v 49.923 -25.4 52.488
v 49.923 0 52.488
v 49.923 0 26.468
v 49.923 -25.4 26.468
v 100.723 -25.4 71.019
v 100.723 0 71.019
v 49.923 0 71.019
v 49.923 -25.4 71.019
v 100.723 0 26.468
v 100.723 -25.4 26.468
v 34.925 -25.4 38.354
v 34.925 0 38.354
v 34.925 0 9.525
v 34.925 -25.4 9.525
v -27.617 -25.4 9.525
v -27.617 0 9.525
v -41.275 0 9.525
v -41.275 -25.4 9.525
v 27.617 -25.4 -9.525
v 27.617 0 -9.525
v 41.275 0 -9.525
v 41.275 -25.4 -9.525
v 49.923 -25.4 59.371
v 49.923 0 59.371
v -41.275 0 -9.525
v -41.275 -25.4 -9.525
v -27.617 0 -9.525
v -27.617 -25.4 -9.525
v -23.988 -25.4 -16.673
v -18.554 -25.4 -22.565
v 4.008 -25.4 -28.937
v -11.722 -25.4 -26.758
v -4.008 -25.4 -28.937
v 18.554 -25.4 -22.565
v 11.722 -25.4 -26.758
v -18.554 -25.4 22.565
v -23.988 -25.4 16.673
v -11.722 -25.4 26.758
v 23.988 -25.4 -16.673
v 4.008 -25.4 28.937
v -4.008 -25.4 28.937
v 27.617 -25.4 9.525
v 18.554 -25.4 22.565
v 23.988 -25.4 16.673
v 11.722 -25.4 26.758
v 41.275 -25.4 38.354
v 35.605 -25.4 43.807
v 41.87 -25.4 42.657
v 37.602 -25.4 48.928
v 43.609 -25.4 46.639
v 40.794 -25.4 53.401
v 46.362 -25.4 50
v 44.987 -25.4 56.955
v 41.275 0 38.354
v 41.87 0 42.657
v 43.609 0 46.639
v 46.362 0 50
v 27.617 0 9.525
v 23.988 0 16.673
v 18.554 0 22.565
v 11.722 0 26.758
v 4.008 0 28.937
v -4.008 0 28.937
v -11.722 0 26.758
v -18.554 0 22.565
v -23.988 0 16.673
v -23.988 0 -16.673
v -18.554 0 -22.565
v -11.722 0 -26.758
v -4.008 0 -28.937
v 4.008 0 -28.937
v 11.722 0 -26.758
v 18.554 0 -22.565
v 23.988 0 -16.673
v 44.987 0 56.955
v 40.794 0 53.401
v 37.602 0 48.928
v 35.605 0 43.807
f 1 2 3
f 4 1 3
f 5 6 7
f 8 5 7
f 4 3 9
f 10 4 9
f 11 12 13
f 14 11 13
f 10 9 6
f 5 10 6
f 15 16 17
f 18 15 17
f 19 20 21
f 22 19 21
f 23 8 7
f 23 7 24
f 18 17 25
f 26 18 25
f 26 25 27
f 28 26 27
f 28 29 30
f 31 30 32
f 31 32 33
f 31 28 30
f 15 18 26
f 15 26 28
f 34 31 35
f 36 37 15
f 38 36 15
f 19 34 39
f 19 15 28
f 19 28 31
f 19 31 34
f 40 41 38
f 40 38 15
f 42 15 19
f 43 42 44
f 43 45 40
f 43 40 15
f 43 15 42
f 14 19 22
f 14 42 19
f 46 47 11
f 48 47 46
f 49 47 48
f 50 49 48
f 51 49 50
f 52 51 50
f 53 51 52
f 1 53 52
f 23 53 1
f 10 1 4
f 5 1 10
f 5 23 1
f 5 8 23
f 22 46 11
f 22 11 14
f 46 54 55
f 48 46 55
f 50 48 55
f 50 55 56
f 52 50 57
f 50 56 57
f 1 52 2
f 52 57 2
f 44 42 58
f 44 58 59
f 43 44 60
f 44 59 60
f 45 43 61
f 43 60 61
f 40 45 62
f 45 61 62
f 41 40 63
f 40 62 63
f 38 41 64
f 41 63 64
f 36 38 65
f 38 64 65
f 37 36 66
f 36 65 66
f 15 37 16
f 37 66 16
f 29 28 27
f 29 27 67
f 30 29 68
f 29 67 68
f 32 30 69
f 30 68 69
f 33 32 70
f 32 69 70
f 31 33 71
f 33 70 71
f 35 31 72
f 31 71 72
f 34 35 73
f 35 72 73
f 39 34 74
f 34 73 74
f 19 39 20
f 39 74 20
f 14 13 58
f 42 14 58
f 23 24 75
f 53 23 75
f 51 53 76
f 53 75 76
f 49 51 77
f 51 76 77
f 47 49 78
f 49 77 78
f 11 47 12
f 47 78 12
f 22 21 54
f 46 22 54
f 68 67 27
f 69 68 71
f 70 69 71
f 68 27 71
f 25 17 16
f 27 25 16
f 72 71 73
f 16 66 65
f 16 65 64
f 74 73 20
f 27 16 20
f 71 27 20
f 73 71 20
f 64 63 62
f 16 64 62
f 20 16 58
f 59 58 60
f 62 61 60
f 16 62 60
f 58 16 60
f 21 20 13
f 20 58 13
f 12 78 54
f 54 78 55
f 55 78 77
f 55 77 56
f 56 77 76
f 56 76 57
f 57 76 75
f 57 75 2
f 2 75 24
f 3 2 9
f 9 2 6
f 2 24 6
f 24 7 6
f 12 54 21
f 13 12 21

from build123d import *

# Parameters (mm, degrees)
F1_DEPTH = 25.4
F2_DEPTH = 25.4
F3_DEPTH = 25.4
F4_DEPTH = 25.4


with BuildPart() as f1:
    # F0 (on Front) → F1 (new body)
    with BuildSketch(Plane.XZ):
        with BuildLine():
            Line((34.9249988794, 38.3535841248), (34.9249988794, 9.525))
            Line((34.9249988794, 9.525), (41.275, 9.525))
            Line((41.275, 9.525), (41.275, 38.3535841248))
            ThreePointArc((41.275, 38.3535841248), (43.6085299046, 46.6387644279), (49.9230897833, 52.4882009827))
            Line((49.9230897833, 52.4882009827), (49.9230897833, 59.3707781223))
            ThreePointArc((49.9230897833, 59.3707781223), (39.0589972297, 51.2635141623), (34.9249988794, 38.3535841248))
        make_face()
        with BuildLine():
            Line((41.275, 9.525), (34.9249988794, 9.525))
            Line((34.9249988794, 9.525), (27.6167455206, 9.525))
            ThreePointArc((27.6167455206, 9.525), (28.811311946, 4.8289297054), (29.2131863745, 0))
            ThreePointArc((29.2131863745, 0), (28.811311946, -4.8289297054), (27.6167455206, -9.525))
            Line((27.6167455206, -9.525), (41.275, -9.525))
            Line((41.275, -9.525), (41.275, 9.525))
        make_face()
        with BuildLine():
            ThreePointArc((29.2131863745, 0), (28.811311946, 4.8289297054), (27.6167455206, 9.525))
            Line((27.6167455206, 9.525), (-27.6167455206, 9.525))
            ThreePointArc((-27.6167455206, 9.525), (-29.2131863745, 0), (-27.6167455206, -9.525))
            Line((-27.6167455206, -9.525), (27.6167455206, -9.525))
            ThreePointArc((27.6167455206, -9.525), (28.811311946, -4.8289297054), (29.2131863745, 0))
        make_face()
        with BuildLine():
            Line((-27.6167455206, 9.525), (27.6167455206, 9.525))
            ThreePointArc((27.6167455206, 9.525), (0, 29.2131863745), (-27.6167455206, 9.525))
        make_face()
        with BuildLine():
            ThreePointArc((-27.6167455206, -9.525), (-29.2131863745, 0), (-27.6167455206, 9.525))
            Line((-27.6167455206, 9.525), (-41.275, 9.525))
            Line((-41.275, 9.525), (-41.275, -9.525))
            Line((-41.275, -9.525), (-27.6167455206, -9.525))
        make_face()
        Polygon((49.9230897833, 71.0192042329), (49.9230897833, 59.3707781223), (49.9230897833, 52.4882009827), (49.9230897833, 26.4684122215), (100.7230897833, 26.4684122215), (100.7230897833, 71.0192042329), align=None)
        with BuildLine():
            ThreePointArc((-27.6167455206, -9.525), (0, -29.2131863745), (27.6167455206, -9.525))
            Line((27.6167455206, -9.525), (-27.6167455206, -9.525))
        make_face()
    extrude(amount=F1_DEPTH)

    # F0 (on Front) → F2 (join)
    with BuildSketch(Plane.XZ):
        with BuildLine():
            Line((34.9249988794, 38.3535841248), (34.9249988794, 9.525))
            Line((34.9249988794, 9.525), (41.275, 9.525))
            Line((41.275, 9.525), (41.275, 38.3535841248))
            ThreePointArc((41.275, 38.3535841248), (43.6085299046, 46.6387644279), (49.9230897833, 52.4882009827))
            Line((49.9230897833, 52.4882009827), (49.9230897833, 59.3707781223))
            ThreePointArc((49.9230897833, 59.3707781223), (39.0589972297, 51.2635141623), (34.9249988794, 38.3535841248))
        make_face()
        with BuildLine():
            Line((41.275, 9.525), (34.9249988794, 9.525))
            Line((34.9249988794, 9.525), (27.6167455206, 9.525))
            ThreePointArc((27.6167455206, 9.525), (28.811311946, 4.8289297054), (29.2131863745, 0))
            ThreePointArc((29.2131863745, 0), (28.811311946, -4.8289297054), (27.6167455206, -9.525))
            Line((27.6167455206, -9.525), (41.275, -9.525))
            Line((41.275, -9.525), (41.275, 9.525))
        make_face()
        with BuildLine():
            ThreePointArc((29.2131863745, 0), (28.811311946, 4.8289297054), (27.6167455206, 9.525))
            Line((27.6167455206, 9.525), (-27.6167455206, 9.525))
            ThreePointArc((-27.6167455206, 9.525), (-29.2131863745, 0), (-27.6167455206, -9.525))
            Line((-27.6167455206, -9.525), (27.6167455206, -9.525))
            ThreePointArc((27.6167455206, -9.525), (28.811311946, -4.8289297054), (29.2131863745, 0))
        make_face()
        with BuildLine():
            Line((-27.6167455206, 9.525), (27.6167455206, 9.525))
            ThreePointArc((27.6167455206, 9.525), (0, 29.2131863745), (-27.6167455206, 9.525))
        make_face()
        with BuildLine():
            ThreePointArc((-27.6167455206, -9.525), (-29.2131863745, 0), (-27.6167455206, 9.525))
            Line((-27.6167455206, 9.525), (-41.275, 9.525))
            Line((-41.275, 9.525), (-41.275, -9.525))
            Line((-41.275, -9.525), (-27.6167455206, -9.525))
        make_face()
        Polygon((49.9230897833, 71.0192042329), (49.9230897833, 59.3707781223), (49.9230897833, 52.4882009827), (49.9230897833, 26.4684122215), (100.7230897833, 26.4684122215), (100.7230897833, 71.0192042329), align=None)
        with BuildLine():
            ThreePointArc((-27.6167455206, -9.525), (0, -29.2131863745), (27.6167455206, -9.525))
            Line((27.6167455206, -9.525), (-27.6167455206, -9.525))
        make_face()
    extrude(amount=F2_DEPTH)

    # F0 (on Front) → F3 (join)
    with BuildSketch(Plane.XZ):
        with BuildLine():
            Line((34.9249988794, 38.3535841248), (34.9249988794, 9.525))
            Line((34.9249988794, 9.525), (41.275, 9.525))
            Line((41.275, 9.525), (41.275, 38.3535841248))
            ThreePointArc((41.275, 38.3535841248), (43.6085299046, 46.6387644279), (49.9230897833, 52.4882009827))
            Line((49.9230897833, 52.4882009827), (49.9230897833, 59.3707781223))
            ThreePointArc((49.9230897833, 59.3707781223), (39.0589972297, 51.2635141623), (34.9249988794, 38.3535841248))
        make_face()
        with BuildLine():
            Line((41.275, 9.525), (34.9249988794, 9.525))
            Line((34.9249988794, 9.525), (27.6167455206, 9.525))
            ThreePointArc((27.6167455206, 9.525), (28.811311946, 4.8289297054), (29.2131863745, 0))
            ThreePointArc((29.2131863745, 0), (28.811311946, -4.8289297054), (27.6167455206, -9.525))
            Line((27.6167455206, -9.525), (41.275, -9.525))
            Line((41.275, -9.525), (41.275, 9.525))
        make_face()
        with BuildLine():
            ThreePointArc((29.2131863745, 0), (28.811311946, 4.8289297054), (27.6167455206, 9.525))
            Line((27.6167455206, 9.525), (-27.6167455206, 9.525))
            ThreePointArc((-27.6167455206, 9.525), (-29.2131863745, 0), (-27.6167455206, -9.525))
            Line((-27.6167455206, -9.525), (27.6167455206, -9.525))
            ThreePointArc((27.6167455206, -9.525), (28.811311946, -4.8289297054), (29.2131863745, 0))
        make_face()
        with BuildLine():
            Line((-27.6167455206, 9.525), (27.6167455206, 9.525))
            ThreePointArc((27.6167455206, 9.525), (0, 29.2131863745), (-27.6167455206, 9.525))
        make_face()
        with BuildLine():
            ThreePointArc((-27.6167455206, -9.525), (-29.2131863745, 0), (-27.6167455206, 9.525))
            Line((-27.6167455206, 9.525), (-41.275, 9.525))
            Line((-41.275, 9.525), (-41.275, -9.525))
            Line((-41.275, -9.525), (-27.6167455206, -9.525))
        make_face()
        Polygon((49.9230897833, 71.0192042329), (49.9230897833, 59.3707781223), (49.9230897833, 52.4882009827), (49.9230897833, 26.4684122215), (100.7230897833, 26.4684122215), (100.7230897833, 71.0192042329), align=None)
        with BuildLine():
            ThreePointArc((-27.6167455206, -9.525), (0, -29.2131863745), (27.6167455206, -9.525))
            Line((27.6167455206, -9.525), (-27.6167455206, -9.525))
        make_face()
    extrude(amount=F3_DEPTH)

    # F0 (on Front) → F4 (join)
    with BuildSketch(Plane.XZ):
        with BuildLine():
            Line((34.9249988794, 38.3535841248), (34.9249988794, 9.525))
            Line((34.9249988794, 9.525), (41.275, 9.525))
            Line((41.275, 9.525), (41.275, 38.3535841248))
            ThreePointArc((41.275, 38.3535841248), (43.6085299046, 46.6387644279), (49.9230897833, 52.4882009827))
            Line((49.9230897833, 52.4882009827), (49.9230897833, 59.3707781223))
            ThreePointArc((49.9230897833, 59.3707781223), (39.0589972297, 51.2635141623), (34.9249988794, 38.3535841248))
        make_face()
        with BuildLine():
            Line((41.275, 9.525), (34.9249988794, 9.525))
            Line((34.9249988794, 9.525), (27.6167455206, 9.525))
            ThreePointArc((27.6167455206, 9.525), (28.811311946, 4.8289297054), (29.2131863745, 0))
            ThreePointArc((29.2131863745, 0), (28.811311946, -4.8289297054), (27.6167455206, -9.525))
            Line((27.6167455206, -9.525), (41.275, -9.525))
            Line((41.275, -9.525), (41.275, 9.525))
        make_face()
        with BuildLine():
            ThreePointArc((29.2131863745, 0), (28.811311946, 4.8289297054), (27.6167455206, 9.525))
            Line((27.6167455206, 9.525), (-27.6167455206, 9.525))
            ThreePointArc((-27.6167455206, 9.525), (-29.2131863745, 0), (-27.6167455206, -9.525))
            Line((-27.6167455206, -9.525), (27.6167455206, -9.525))
            ThreePointArc((27.6167455206, -9.525), (28.811311946, -4.8289297054), (29.2131863745, 0))
        make_face()
        with BuildLine():
            Line((-27.6167455206, 9.525), (27.6167455206, 9.525))
            ThreePointArc((27.6167455206, 9.525), (0, 29.2131863745), (-27.6167455206, 9.525))
        make_face()
        with BuildLine():
            ThreePointArc((-27.6167455206, -9.525), (-29.2131863745, 0), (-27.6167455206, 9.525))
            Line((-27.6167455206, 9.525), (-41.275, 9.525))
            Line((-41.275, 9.525), (-41.275, -9.525))
            Line((-41.275, -9.525), (-27.6167455206, -9.525))
        make_face()
        Polygon((49.9230897833, 71.0192042329), (49.9230897833, 59.3707781223), (49.9230897833, 52.4882009827), (49.9230897833, 26.4684122215), (100.7230897833, 26.4684122215), (100.7230897833, 71.0192042329), align=None)
        with BuildLine():
            ThreePointArc((-27.6167455206, -9.525), (0, -29.2131863745), (27.6167455206, -9.525))
            Line((27.6167455206, -9.525), (-27.6167455206, -9.525))
        make_face()
    extrude(amount=F4_DEPTH)


solid = f1.part
